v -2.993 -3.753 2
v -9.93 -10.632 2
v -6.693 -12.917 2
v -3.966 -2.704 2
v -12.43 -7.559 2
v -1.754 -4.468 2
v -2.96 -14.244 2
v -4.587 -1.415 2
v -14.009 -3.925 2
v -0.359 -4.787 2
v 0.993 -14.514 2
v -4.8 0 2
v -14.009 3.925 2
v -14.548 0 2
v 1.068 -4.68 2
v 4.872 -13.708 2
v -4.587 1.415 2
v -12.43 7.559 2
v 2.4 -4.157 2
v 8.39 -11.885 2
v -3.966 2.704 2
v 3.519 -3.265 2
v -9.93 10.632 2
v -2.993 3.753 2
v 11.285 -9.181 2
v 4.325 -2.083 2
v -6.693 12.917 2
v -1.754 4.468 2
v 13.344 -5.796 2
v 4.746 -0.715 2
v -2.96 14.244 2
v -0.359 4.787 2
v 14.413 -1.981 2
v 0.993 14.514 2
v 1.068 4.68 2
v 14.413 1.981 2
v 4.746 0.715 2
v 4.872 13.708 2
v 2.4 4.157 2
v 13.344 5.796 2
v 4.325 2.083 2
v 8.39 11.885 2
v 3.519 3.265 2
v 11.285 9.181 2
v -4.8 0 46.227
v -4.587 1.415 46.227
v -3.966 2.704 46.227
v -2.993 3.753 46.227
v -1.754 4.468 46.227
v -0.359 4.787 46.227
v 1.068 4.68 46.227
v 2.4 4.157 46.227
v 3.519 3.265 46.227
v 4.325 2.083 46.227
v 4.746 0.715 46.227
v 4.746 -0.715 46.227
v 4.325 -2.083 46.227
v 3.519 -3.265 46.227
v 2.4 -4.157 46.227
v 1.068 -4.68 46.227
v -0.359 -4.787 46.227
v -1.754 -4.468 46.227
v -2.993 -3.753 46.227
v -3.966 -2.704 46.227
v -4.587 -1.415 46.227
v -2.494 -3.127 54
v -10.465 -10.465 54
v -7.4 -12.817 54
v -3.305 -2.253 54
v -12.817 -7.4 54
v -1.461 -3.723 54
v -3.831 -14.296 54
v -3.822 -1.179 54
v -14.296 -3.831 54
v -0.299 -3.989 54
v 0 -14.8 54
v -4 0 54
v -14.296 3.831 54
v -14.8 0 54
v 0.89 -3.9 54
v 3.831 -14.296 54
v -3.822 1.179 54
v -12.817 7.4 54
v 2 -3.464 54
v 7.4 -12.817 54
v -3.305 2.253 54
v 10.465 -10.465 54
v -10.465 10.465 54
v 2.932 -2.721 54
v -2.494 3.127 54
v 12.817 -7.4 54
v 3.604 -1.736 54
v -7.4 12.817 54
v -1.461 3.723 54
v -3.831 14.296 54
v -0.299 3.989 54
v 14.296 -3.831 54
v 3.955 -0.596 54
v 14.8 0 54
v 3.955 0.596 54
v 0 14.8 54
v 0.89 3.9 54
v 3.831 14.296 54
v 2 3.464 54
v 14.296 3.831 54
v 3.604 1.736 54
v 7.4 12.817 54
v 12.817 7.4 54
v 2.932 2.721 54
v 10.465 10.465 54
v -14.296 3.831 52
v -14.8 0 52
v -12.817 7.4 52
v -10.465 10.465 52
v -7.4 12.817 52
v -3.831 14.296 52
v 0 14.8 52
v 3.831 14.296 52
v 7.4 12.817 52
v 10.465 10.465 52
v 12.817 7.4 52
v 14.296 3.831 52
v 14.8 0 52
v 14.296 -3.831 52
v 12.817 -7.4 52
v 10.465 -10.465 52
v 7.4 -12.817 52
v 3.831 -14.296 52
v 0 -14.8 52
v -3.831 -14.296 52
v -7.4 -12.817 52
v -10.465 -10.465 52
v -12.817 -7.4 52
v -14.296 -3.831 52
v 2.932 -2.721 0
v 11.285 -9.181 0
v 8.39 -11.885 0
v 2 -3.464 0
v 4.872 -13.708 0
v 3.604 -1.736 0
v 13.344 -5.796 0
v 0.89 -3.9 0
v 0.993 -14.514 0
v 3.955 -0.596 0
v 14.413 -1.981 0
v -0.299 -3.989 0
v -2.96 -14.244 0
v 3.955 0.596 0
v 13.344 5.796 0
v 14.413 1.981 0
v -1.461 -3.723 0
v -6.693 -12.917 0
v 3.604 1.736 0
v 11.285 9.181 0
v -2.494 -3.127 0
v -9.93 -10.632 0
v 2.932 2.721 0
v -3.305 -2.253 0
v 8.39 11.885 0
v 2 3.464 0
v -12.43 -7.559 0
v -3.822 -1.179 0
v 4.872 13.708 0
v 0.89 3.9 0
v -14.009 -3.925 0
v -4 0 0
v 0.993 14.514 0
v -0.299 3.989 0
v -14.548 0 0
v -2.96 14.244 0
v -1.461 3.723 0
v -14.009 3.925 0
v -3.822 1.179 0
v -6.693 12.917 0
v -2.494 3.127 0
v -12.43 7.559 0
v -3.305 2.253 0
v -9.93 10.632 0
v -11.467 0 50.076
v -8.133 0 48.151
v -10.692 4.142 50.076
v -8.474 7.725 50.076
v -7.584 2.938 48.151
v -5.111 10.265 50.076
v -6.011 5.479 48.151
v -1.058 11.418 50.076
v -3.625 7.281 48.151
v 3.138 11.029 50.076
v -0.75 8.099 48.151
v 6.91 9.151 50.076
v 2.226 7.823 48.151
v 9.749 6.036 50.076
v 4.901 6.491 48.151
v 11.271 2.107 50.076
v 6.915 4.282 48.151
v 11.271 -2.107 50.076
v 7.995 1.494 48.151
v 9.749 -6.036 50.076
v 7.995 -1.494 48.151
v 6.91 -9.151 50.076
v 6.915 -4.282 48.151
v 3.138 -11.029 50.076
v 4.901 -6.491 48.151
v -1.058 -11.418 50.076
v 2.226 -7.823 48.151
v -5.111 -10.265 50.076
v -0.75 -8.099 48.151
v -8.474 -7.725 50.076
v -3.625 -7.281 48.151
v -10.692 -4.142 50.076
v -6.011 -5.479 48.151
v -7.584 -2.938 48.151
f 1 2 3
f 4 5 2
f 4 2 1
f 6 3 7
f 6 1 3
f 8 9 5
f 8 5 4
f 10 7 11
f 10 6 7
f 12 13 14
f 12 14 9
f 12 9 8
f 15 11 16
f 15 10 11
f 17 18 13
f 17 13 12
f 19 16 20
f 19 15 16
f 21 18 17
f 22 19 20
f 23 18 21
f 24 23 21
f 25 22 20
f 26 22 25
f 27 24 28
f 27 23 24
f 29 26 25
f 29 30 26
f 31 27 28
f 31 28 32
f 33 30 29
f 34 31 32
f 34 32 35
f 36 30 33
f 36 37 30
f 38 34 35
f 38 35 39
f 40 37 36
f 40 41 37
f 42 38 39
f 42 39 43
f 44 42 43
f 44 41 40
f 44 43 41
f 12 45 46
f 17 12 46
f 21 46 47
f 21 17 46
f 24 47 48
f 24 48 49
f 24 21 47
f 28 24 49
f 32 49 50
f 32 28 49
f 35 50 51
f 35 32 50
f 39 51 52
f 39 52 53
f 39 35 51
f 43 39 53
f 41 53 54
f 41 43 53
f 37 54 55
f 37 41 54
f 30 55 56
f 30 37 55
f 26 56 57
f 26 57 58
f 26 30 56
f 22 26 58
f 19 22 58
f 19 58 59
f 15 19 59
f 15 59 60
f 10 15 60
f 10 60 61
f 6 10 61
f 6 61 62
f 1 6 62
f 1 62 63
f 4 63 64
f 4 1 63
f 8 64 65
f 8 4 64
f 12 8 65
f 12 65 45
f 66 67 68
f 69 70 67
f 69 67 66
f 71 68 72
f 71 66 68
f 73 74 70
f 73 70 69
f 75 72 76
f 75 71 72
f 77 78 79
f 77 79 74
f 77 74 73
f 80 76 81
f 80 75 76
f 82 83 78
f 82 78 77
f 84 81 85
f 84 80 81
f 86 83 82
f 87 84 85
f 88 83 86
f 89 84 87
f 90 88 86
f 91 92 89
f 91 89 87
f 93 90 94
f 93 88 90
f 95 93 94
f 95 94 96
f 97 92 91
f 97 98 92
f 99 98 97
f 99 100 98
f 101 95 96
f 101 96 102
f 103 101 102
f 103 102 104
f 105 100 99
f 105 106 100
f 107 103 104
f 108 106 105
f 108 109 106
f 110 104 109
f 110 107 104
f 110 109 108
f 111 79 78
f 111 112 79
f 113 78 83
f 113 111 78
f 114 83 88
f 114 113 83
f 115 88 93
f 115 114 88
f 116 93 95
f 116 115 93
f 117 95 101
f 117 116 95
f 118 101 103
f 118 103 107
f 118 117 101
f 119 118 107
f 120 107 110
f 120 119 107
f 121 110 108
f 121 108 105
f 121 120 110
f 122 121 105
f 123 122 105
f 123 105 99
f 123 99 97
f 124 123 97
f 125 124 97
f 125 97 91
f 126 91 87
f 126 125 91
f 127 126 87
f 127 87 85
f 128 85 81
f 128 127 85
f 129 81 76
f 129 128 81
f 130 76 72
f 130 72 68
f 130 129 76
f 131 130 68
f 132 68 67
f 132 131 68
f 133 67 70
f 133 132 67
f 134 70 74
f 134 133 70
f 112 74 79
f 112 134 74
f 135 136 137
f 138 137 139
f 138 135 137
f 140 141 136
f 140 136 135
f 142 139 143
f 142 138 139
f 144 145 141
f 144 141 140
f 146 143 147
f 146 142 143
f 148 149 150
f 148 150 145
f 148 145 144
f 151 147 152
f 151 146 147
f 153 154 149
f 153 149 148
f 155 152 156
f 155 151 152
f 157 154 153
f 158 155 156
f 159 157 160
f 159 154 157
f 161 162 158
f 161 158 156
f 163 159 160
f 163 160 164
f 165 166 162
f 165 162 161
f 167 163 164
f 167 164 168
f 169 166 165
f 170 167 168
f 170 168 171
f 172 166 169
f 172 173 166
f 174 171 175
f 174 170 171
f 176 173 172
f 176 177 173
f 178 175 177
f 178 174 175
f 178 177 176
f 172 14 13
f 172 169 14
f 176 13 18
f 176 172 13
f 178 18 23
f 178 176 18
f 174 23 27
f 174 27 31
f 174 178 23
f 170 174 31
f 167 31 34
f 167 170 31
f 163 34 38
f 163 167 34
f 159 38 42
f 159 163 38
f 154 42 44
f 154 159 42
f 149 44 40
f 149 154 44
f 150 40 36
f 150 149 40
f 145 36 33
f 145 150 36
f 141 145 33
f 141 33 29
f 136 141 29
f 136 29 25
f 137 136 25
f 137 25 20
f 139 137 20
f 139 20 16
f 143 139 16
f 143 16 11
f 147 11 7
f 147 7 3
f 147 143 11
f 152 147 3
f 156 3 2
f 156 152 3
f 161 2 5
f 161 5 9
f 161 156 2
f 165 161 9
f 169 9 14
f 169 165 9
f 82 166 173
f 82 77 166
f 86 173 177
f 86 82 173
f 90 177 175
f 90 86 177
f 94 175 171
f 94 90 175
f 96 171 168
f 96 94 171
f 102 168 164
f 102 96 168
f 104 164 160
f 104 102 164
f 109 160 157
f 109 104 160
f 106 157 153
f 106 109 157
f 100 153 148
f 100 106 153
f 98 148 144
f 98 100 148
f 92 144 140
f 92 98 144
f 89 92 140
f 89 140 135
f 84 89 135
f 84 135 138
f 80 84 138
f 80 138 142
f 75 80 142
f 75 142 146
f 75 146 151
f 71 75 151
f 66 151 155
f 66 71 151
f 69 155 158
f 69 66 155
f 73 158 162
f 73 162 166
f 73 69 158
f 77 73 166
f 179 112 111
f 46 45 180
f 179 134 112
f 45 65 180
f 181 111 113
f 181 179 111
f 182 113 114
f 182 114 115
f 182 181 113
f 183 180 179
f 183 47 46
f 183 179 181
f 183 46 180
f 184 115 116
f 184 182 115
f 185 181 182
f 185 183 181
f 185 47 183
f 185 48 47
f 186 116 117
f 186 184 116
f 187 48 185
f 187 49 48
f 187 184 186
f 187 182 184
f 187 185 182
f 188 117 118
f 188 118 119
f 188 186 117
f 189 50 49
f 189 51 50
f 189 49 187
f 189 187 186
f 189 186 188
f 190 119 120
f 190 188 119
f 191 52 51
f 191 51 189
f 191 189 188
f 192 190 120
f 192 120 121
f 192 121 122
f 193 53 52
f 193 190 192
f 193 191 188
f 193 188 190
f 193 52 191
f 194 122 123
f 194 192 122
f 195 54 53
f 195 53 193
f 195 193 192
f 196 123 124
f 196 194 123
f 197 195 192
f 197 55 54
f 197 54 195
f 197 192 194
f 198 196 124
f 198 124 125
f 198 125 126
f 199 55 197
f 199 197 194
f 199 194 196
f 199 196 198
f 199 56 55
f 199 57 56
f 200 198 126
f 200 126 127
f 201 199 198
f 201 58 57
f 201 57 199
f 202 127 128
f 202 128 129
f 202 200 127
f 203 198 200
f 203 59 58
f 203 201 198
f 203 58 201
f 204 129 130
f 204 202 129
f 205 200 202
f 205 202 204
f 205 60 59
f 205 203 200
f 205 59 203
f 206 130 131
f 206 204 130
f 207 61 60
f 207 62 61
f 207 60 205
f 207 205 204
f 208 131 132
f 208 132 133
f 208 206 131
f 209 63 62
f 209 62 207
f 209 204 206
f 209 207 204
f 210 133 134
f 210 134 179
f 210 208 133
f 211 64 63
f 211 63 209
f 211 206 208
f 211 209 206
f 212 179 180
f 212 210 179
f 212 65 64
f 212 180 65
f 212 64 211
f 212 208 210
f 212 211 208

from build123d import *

# Parameters (mm, degrees)
F2_SIZE2 = 5.773493
F2_SIZE  = 9.99999


# Not quite as in the source:
# - a fillet or chamfer is up to 0.001 mm smaller than in the source, because OpenCascade refuses the exact size


with BuildPart() as f1:
    # F0 (on Front) → F1 (revolve)
    with BuildSketch(Plane.XZ):
        Polygon((-14.5480483851, 0), (-4, 0), (-4, 54), (-14.8, 54), (-14.8, 52), (-4.8, 52), (-4.8, 2), (-14.5480483851, 2), align=None)
    revolve(axis=Axis((0, 0, 27), (0, 0, -1)))

    # F2 (size 10 and 5.7735026919 in the source; OpenCascade refuses exactly that, so slightly less here)
    f2_edges = [f1.edges().sort_by_distance(p)[0] for p in [
        (4.8, 0, 52),
    ]]
    chamfer(f2_edges, length=F2_SIZE, length2=F2_SIZE2)


solid = f1.part
